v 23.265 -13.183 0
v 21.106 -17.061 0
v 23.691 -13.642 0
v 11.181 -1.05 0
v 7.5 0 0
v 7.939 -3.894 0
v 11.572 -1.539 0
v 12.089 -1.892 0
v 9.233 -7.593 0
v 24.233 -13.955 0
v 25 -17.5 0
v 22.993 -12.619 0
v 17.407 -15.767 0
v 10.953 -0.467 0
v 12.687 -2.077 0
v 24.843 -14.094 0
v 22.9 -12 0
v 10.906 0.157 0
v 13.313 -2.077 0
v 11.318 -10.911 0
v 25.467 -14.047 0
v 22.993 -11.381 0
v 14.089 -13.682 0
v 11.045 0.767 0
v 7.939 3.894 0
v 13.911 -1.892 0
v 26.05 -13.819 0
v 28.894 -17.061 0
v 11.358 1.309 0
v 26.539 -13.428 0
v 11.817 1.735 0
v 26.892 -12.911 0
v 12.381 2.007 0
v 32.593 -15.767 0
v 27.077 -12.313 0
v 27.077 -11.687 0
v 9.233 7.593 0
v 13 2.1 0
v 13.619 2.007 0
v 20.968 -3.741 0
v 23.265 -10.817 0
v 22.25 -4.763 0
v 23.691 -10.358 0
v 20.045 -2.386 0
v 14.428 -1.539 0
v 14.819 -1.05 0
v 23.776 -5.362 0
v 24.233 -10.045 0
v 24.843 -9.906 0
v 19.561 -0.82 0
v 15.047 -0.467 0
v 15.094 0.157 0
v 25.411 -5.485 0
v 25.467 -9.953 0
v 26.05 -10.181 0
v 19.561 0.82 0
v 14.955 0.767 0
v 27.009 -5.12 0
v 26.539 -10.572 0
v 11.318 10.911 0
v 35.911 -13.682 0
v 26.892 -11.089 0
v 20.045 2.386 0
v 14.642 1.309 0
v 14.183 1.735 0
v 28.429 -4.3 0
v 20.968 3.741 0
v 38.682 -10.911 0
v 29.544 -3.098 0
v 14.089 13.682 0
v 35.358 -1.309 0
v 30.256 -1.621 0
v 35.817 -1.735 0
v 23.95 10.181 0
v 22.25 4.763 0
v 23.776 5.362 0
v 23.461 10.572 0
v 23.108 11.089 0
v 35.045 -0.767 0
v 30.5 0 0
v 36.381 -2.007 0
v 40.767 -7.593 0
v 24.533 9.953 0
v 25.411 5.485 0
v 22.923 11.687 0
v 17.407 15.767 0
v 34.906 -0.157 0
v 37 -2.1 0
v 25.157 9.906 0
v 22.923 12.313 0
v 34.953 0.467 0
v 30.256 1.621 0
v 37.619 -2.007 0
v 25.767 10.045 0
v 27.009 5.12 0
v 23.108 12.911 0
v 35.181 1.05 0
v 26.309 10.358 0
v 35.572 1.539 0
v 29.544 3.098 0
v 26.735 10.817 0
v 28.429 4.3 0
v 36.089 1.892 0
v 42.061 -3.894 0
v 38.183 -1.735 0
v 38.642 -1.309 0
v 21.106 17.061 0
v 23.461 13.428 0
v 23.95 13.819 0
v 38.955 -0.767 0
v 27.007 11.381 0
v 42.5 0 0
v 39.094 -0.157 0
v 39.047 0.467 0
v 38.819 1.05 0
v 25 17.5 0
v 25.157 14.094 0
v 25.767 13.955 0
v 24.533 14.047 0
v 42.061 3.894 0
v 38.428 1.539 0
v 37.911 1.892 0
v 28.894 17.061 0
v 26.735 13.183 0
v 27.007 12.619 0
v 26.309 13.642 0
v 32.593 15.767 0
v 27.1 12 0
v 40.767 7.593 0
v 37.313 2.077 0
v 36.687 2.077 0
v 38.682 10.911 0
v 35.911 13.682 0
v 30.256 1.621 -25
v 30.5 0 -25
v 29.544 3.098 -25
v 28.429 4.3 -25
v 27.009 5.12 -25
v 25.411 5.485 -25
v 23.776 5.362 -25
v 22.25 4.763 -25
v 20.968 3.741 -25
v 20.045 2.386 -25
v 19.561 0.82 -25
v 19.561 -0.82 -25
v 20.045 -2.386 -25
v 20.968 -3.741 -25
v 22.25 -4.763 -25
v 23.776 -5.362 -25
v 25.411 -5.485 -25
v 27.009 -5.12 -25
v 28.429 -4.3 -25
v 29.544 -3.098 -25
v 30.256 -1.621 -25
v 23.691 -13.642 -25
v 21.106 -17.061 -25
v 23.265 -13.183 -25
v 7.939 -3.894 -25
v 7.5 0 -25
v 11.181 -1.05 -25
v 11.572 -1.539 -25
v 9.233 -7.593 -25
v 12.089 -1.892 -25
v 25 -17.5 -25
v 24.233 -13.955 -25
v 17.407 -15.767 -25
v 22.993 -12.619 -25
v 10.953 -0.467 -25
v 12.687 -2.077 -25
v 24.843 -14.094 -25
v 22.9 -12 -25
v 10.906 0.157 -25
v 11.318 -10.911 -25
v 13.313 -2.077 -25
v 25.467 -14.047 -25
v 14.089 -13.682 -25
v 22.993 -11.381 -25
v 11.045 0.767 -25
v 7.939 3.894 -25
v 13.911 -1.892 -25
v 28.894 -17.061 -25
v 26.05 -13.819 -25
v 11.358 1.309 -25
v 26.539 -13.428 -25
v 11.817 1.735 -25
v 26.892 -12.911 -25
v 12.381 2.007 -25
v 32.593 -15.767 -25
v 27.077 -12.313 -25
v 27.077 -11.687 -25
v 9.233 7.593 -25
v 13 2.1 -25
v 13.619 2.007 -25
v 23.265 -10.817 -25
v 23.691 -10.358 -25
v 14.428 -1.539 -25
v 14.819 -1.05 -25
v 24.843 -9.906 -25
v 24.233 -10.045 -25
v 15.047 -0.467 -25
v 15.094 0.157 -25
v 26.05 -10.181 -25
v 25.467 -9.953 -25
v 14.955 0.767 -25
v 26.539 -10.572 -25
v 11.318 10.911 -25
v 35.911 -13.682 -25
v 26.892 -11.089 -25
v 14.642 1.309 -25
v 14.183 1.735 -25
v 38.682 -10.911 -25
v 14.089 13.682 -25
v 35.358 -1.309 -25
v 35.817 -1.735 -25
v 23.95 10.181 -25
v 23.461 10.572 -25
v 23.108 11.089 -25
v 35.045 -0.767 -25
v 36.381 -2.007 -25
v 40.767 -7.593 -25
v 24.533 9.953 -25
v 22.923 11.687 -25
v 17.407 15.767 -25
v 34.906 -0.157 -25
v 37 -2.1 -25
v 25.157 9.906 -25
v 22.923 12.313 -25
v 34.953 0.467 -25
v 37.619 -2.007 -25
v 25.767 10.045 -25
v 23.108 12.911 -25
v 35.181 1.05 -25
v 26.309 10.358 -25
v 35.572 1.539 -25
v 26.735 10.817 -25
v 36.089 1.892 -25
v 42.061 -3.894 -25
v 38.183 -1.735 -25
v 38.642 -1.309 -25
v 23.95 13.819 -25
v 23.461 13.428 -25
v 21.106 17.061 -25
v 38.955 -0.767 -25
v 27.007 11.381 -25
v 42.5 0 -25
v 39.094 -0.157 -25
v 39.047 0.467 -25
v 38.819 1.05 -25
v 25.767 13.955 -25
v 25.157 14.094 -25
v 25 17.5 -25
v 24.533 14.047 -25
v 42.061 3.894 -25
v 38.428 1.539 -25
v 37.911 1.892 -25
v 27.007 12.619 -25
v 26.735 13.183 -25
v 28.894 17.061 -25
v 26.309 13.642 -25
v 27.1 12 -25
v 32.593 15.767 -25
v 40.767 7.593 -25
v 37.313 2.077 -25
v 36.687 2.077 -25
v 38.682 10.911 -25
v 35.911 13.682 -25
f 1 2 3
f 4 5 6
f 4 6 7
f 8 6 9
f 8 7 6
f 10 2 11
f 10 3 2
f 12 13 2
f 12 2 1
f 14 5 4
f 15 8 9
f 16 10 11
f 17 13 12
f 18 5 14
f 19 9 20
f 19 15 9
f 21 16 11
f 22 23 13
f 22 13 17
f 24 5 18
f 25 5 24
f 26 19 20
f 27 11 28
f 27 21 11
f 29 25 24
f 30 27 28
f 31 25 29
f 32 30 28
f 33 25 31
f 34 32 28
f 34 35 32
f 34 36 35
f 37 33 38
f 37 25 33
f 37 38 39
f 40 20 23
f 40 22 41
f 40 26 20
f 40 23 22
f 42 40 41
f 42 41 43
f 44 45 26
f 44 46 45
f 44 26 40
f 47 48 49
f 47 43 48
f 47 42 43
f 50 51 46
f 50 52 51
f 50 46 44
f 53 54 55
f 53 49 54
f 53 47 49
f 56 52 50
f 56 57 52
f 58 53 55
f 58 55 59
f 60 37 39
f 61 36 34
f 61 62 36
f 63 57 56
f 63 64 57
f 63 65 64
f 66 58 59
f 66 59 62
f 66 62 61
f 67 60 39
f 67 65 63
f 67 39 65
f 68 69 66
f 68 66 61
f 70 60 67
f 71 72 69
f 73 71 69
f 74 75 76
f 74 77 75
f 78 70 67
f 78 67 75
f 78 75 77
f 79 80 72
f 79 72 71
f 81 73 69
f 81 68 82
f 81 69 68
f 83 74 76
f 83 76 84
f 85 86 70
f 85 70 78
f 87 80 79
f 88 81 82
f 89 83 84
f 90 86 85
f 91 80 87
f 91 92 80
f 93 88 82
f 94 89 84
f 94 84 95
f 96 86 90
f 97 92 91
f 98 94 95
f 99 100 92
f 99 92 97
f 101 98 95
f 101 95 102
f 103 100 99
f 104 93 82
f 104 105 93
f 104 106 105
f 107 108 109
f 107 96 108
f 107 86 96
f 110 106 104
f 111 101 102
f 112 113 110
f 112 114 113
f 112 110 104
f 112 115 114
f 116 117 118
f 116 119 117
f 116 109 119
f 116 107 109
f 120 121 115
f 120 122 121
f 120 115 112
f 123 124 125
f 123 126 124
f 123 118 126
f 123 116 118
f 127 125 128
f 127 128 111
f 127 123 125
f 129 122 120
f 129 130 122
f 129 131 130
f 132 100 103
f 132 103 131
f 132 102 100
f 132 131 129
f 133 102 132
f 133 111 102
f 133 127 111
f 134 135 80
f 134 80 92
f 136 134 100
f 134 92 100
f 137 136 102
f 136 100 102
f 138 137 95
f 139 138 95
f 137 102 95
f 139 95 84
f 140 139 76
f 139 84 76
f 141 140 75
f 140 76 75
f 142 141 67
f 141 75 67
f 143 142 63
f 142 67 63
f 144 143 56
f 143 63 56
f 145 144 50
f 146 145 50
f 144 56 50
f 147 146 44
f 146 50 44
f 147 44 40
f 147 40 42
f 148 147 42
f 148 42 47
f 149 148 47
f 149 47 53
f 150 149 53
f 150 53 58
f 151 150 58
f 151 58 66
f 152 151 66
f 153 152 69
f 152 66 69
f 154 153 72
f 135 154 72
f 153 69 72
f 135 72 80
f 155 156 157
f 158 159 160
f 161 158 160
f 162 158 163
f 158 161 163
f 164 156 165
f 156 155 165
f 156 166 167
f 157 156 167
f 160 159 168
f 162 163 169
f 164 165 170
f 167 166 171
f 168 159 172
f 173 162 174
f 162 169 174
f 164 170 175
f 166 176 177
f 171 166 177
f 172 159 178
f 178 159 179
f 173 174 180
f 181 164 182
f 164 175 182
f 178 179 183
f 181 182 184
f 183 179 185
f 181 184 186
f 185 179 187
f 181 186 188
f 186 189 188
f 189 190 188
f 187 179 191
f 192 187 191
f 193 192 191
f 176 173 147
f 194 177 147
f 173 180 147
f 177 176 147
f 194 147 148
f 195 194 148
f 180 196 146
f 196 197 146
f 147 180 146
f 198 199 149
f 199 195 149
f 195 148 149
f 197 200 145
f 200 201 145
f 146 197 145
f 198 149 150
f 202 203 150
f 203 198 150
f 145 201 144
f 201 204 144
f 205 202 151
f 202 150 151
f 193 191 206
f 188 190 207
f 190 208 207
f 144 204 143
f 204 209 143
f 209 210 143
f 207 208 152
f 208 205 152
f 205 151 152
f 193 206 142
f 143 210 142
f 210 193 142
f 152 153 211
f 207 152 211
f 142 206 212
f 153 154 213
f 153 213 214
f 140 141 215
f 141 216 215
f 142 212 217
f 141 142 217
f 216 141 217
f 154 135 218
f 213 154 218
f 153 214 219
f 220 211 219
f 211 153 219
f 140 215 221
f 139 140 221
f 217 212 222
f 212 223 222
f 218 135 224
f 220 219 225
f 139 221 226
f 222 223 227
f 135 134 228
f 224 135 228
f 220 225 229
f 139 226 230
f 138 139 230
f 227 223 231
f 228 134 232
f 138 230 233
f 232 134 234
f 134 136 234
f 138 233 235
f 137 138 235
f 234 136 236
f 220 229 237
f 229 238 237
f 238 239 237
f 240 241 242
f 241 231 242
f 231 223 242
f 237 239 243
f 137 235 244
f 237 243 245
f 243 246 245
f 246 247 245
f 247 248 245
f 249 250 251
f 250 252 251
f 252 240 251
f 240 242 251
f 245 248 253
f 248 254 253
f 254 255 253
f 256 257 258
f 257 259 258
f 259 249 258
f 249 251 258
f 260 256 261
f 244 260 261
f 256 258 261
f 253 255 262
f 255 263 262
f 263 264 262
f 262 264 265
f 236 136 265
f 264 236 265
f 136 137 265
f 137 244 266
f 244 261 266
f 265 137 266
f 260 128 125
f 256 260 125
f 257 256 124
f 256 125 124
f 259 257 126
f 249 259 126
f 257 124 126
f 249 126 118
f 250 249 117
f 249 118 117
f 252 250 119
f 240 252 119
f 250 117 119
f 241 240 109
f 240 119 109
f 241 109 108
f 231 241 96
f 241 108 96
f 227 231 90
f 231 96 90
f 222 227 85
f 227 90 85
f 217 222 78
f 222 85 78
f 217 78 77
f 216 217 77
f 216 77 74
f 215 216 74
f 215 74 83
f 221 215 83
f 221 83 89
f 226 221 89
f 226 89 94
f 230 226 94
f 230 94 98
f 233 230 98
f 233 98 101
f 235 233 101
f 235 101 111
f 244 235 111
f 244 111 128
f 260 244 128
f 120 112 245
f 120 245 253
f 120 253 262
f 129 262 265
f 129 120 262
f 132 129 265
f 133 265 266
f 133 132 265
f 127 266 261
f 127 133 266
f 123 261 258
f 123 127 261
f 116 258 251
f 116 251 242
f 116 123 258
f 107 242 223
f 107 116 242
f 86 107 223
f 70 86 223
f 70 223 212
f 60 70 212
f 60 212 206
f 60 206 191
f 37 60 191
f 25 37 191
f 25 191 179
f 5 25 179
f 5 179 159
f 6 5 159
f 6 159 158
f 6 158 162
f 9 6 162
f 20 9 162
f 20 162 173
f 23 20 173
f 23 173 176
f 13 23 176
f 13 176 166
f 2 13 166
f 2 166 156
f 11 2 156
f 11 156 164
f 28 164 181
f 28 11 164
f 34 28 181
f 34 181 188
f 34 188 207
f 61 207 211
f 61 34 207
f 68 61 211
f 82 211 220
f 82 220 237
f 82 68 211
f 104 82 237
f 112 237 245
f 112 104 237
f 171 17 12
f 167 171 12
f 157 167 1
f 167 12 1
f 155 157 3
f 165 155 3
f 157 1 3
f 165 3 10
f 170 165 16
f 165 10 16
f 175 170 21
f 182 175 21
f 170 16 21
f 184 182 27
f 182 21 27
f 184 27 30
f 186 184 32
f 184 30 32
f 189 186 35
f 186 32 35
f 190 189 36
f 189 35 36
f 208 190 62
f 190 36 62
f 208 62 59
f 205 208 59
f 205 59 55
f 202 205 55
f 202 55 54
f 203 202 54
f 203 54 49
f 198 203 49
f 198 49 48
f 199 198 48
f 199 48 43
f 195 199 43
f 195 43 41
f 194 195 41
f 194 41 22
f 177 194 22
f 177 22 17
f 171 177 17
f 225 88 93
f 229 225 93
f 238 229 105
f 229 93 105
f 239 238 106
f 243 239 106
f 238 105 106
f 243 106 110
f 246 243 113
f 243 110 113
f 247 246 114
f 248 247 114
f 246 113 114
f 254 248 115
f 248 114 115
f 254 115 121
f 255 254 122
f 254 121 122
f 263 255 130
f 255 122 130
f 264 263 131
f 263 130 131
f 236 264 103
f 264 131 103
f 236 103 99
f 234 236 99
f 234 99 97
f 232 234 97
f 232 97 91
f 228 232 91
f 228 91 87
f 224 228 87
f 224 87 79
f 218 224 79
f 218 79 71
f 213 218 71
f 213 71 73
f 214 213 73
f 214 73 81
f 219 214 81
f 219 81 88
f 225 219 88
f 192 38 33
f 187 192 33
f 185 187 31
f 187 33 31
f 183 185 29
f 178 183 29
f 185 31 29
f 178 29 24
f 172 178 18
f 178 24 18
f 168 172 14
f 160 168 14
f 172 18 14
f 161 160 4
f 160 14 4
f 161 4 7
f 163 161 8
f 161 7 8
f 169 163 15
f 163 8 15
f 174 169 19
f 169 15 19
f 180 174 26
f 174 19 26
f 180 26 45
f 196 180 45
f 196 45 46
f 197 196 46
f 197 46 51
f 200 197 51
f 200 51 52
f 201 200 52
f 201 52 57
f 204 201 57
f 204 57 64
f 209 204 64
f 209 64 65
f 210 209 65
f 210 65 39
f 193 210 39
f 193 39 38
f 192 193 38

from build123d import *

# Parameters (mm, degrees)
SKETCH1_R           = 60
SKETCH1_R_2         = 5.5
SKETCH1_R_3         = 9
BOSS_EXTRUDE1_DEPTH = 25
CUT_EXTRUDE7_REACH  = 90.459
SKETCH6_R           = 2.1
CIRPATTERN4_COUNT   = 4
SKETCH2_R           = 63
SKETCH2_R_2         = 60
BOSS_EXTRUDE2_DEPTH = 300
SKETCH3_R           = 11.04
CUT_EXTRUDE1_DEPTH  = 10
CUT_EXTRUDE2_REACH  = 314.95
SKETCH4_R           = 1.5
CIRPATTERN1_COUNT   = 4
CUT_EXTRUDE3_DEPTH  = 3
CIRPATTERN2_COUNT   = 4
SKETCH7_OUTSIDE_W   = 197.786
SKETCH7_OUTSIDE_H   = 197.786
SKETCH7_OUTSIDE_R   = 17.5
CUT_EXTRUDE8_DEPTH  = 313.950475315


with BuildPart() as part:
    # Sketch1 → Boss-Extrude1 (new body)
    with BuildSketch(Plane.XY):
        Circle(SKETCH1_R)
        with Locations((25, 0)):
            Circle(SKETCH1_R_2, mode=Mode.SUBTRACT)
        with Locations((-25, 0)):
            Circle(SKETCH1_R_3, mode=Mode.SUBTRACT)
    extrude(amount=-BOSS_EXTRUDE1_DEPTH)

    # Sketch6 → Cut-Extrude7 (cut, up to next)
    with BuildSketch(Plane.XY, mode=Mode.PRIVATE) as cut_extrude7_sk1:
        with Locations((25, 12)):
            Circle(SKETCH6_R)
    cut_extrude7_tool1 = extrude(cut_extrude7_sk1.sketch, amount=-CUT_EXTRUDE7_REACH, mode=Mode.PRIVATE) & part.part
    cut_extrude7 = cut_extrude7_tool1.solids().sort_by_distance((25, 12, 0))[0]
    add(cut_extrude7, mode=Mode.SUBTRACT)

    # CirPattern4: Cut-Extrude7 ×4 about axis
    cirpattern4_axis = Axis((25, 0, 0), (0, 0, 1))
    for i in range(1, CIRPATTERN4_COUNT):
        add(cut_extrude7.rotate(cirpattern4_axis, i * 360 / CIRPATTERN4_COUNT), mode=Mode.SUBTRACT)

    # Sketch2 → Boss-Extrude2 (add)
    with BuildSketch(Plane.XY):
        Circle(SKETCH2_R)
        Circle(SKETCH2_R_2, mode=Mode.SUBTRACT)
    extrude(amount=-BOSS_EXTRUDE2_DEPTH)

    # Sketch3 → Cut-Extrude1 (cut)
    with BuildSketch(Plane(origin=(0, 0, -25), x_dir=(-1, 0, 0), z_dir=(0, 0, -1))):
        with Locations((25, 0)):
            Circle(SKETCH3_R)
    extrude(amount=-CUT_EXTRUDE1_DEPTH, mode=Mode.SUBTRACT)

    # Sketch4 → Cut-Extrude2 (cut, up to next)
    with BuildSketch(Plane.XY, mode=Mode.PRIVATE) as cut_extrude2_sk1:
        with Locations((-39, 0)):
            Circle(SKETCH4_R)
    cut_extrude2_tool1 = extrude(cut_extrude2_sk1.sketch, amount=-CUT_EXTRUDE2_REACH, mode=Mode.PRIVATE) & part.part
    cut_extrude2 = cut_extrude2_tool1.solids().sort_by_distance((-39, 0, 0))[0]
    add(cut_extrude2, mode=Mode.SUBTRACT)

    # CirPattern1: Cut-Extrude2 ×4 about axis
    cirpattern1_axis = Axis((-25, 0, 0), (0, 0, 1))
    for i in range(1, CIRPATTERN1_COUNT):
        add(cut_extrude2.rotate(cirpattern1_axis, i * 360 / CIRPATTERN1_COUNT), mode=Mode.SUBTRACT)

    # Sketch5 → Cut-Extrude3 (cut)
    with BuildSketch(Plane.XY):
        Polygon((-12.732050808, -3), (-9.267949192, -3), (-7.535898385, 0), (-9.267949192, 3), (-12.732050808, 3), (-14.464101615, 0), align=None)
    cut_extrude3 = extrude(amount=-CUT_EXTRUDE3_DEPTH, mode=Mode.SUBTRACT)

    # CirPattern2: Cut-Extrude3 ×4 about axis
    cirpattern2_axis = Axis((-25, 0, 0), (0, 0, 1))
    for i in range(1, CIRPATTERN2_COUNT):
        add(cut_extrude3.rotate(cirpattern2_axis, i * 360 / CIRPATTERN2_COUNT), mode=Mode.SUBTRACT)

    # Sketch7 outside → Cut-Extrude8 (cut, through all)
    with BuildSketch(Plane.XY):
        Rectangle(SKETCH7_OUTSIDE_W, SKETCH7_OUTSIDE_H)
        with Locations((25, 0)):
            Circle(SKETCH7_OUTSIDE_R, mode=Mode.SUBTRACT)
    extrude(amount=-CUT_EXTRUDE8_DEPTH, mode=Mode.SUBTRACT)


solid = part.part
